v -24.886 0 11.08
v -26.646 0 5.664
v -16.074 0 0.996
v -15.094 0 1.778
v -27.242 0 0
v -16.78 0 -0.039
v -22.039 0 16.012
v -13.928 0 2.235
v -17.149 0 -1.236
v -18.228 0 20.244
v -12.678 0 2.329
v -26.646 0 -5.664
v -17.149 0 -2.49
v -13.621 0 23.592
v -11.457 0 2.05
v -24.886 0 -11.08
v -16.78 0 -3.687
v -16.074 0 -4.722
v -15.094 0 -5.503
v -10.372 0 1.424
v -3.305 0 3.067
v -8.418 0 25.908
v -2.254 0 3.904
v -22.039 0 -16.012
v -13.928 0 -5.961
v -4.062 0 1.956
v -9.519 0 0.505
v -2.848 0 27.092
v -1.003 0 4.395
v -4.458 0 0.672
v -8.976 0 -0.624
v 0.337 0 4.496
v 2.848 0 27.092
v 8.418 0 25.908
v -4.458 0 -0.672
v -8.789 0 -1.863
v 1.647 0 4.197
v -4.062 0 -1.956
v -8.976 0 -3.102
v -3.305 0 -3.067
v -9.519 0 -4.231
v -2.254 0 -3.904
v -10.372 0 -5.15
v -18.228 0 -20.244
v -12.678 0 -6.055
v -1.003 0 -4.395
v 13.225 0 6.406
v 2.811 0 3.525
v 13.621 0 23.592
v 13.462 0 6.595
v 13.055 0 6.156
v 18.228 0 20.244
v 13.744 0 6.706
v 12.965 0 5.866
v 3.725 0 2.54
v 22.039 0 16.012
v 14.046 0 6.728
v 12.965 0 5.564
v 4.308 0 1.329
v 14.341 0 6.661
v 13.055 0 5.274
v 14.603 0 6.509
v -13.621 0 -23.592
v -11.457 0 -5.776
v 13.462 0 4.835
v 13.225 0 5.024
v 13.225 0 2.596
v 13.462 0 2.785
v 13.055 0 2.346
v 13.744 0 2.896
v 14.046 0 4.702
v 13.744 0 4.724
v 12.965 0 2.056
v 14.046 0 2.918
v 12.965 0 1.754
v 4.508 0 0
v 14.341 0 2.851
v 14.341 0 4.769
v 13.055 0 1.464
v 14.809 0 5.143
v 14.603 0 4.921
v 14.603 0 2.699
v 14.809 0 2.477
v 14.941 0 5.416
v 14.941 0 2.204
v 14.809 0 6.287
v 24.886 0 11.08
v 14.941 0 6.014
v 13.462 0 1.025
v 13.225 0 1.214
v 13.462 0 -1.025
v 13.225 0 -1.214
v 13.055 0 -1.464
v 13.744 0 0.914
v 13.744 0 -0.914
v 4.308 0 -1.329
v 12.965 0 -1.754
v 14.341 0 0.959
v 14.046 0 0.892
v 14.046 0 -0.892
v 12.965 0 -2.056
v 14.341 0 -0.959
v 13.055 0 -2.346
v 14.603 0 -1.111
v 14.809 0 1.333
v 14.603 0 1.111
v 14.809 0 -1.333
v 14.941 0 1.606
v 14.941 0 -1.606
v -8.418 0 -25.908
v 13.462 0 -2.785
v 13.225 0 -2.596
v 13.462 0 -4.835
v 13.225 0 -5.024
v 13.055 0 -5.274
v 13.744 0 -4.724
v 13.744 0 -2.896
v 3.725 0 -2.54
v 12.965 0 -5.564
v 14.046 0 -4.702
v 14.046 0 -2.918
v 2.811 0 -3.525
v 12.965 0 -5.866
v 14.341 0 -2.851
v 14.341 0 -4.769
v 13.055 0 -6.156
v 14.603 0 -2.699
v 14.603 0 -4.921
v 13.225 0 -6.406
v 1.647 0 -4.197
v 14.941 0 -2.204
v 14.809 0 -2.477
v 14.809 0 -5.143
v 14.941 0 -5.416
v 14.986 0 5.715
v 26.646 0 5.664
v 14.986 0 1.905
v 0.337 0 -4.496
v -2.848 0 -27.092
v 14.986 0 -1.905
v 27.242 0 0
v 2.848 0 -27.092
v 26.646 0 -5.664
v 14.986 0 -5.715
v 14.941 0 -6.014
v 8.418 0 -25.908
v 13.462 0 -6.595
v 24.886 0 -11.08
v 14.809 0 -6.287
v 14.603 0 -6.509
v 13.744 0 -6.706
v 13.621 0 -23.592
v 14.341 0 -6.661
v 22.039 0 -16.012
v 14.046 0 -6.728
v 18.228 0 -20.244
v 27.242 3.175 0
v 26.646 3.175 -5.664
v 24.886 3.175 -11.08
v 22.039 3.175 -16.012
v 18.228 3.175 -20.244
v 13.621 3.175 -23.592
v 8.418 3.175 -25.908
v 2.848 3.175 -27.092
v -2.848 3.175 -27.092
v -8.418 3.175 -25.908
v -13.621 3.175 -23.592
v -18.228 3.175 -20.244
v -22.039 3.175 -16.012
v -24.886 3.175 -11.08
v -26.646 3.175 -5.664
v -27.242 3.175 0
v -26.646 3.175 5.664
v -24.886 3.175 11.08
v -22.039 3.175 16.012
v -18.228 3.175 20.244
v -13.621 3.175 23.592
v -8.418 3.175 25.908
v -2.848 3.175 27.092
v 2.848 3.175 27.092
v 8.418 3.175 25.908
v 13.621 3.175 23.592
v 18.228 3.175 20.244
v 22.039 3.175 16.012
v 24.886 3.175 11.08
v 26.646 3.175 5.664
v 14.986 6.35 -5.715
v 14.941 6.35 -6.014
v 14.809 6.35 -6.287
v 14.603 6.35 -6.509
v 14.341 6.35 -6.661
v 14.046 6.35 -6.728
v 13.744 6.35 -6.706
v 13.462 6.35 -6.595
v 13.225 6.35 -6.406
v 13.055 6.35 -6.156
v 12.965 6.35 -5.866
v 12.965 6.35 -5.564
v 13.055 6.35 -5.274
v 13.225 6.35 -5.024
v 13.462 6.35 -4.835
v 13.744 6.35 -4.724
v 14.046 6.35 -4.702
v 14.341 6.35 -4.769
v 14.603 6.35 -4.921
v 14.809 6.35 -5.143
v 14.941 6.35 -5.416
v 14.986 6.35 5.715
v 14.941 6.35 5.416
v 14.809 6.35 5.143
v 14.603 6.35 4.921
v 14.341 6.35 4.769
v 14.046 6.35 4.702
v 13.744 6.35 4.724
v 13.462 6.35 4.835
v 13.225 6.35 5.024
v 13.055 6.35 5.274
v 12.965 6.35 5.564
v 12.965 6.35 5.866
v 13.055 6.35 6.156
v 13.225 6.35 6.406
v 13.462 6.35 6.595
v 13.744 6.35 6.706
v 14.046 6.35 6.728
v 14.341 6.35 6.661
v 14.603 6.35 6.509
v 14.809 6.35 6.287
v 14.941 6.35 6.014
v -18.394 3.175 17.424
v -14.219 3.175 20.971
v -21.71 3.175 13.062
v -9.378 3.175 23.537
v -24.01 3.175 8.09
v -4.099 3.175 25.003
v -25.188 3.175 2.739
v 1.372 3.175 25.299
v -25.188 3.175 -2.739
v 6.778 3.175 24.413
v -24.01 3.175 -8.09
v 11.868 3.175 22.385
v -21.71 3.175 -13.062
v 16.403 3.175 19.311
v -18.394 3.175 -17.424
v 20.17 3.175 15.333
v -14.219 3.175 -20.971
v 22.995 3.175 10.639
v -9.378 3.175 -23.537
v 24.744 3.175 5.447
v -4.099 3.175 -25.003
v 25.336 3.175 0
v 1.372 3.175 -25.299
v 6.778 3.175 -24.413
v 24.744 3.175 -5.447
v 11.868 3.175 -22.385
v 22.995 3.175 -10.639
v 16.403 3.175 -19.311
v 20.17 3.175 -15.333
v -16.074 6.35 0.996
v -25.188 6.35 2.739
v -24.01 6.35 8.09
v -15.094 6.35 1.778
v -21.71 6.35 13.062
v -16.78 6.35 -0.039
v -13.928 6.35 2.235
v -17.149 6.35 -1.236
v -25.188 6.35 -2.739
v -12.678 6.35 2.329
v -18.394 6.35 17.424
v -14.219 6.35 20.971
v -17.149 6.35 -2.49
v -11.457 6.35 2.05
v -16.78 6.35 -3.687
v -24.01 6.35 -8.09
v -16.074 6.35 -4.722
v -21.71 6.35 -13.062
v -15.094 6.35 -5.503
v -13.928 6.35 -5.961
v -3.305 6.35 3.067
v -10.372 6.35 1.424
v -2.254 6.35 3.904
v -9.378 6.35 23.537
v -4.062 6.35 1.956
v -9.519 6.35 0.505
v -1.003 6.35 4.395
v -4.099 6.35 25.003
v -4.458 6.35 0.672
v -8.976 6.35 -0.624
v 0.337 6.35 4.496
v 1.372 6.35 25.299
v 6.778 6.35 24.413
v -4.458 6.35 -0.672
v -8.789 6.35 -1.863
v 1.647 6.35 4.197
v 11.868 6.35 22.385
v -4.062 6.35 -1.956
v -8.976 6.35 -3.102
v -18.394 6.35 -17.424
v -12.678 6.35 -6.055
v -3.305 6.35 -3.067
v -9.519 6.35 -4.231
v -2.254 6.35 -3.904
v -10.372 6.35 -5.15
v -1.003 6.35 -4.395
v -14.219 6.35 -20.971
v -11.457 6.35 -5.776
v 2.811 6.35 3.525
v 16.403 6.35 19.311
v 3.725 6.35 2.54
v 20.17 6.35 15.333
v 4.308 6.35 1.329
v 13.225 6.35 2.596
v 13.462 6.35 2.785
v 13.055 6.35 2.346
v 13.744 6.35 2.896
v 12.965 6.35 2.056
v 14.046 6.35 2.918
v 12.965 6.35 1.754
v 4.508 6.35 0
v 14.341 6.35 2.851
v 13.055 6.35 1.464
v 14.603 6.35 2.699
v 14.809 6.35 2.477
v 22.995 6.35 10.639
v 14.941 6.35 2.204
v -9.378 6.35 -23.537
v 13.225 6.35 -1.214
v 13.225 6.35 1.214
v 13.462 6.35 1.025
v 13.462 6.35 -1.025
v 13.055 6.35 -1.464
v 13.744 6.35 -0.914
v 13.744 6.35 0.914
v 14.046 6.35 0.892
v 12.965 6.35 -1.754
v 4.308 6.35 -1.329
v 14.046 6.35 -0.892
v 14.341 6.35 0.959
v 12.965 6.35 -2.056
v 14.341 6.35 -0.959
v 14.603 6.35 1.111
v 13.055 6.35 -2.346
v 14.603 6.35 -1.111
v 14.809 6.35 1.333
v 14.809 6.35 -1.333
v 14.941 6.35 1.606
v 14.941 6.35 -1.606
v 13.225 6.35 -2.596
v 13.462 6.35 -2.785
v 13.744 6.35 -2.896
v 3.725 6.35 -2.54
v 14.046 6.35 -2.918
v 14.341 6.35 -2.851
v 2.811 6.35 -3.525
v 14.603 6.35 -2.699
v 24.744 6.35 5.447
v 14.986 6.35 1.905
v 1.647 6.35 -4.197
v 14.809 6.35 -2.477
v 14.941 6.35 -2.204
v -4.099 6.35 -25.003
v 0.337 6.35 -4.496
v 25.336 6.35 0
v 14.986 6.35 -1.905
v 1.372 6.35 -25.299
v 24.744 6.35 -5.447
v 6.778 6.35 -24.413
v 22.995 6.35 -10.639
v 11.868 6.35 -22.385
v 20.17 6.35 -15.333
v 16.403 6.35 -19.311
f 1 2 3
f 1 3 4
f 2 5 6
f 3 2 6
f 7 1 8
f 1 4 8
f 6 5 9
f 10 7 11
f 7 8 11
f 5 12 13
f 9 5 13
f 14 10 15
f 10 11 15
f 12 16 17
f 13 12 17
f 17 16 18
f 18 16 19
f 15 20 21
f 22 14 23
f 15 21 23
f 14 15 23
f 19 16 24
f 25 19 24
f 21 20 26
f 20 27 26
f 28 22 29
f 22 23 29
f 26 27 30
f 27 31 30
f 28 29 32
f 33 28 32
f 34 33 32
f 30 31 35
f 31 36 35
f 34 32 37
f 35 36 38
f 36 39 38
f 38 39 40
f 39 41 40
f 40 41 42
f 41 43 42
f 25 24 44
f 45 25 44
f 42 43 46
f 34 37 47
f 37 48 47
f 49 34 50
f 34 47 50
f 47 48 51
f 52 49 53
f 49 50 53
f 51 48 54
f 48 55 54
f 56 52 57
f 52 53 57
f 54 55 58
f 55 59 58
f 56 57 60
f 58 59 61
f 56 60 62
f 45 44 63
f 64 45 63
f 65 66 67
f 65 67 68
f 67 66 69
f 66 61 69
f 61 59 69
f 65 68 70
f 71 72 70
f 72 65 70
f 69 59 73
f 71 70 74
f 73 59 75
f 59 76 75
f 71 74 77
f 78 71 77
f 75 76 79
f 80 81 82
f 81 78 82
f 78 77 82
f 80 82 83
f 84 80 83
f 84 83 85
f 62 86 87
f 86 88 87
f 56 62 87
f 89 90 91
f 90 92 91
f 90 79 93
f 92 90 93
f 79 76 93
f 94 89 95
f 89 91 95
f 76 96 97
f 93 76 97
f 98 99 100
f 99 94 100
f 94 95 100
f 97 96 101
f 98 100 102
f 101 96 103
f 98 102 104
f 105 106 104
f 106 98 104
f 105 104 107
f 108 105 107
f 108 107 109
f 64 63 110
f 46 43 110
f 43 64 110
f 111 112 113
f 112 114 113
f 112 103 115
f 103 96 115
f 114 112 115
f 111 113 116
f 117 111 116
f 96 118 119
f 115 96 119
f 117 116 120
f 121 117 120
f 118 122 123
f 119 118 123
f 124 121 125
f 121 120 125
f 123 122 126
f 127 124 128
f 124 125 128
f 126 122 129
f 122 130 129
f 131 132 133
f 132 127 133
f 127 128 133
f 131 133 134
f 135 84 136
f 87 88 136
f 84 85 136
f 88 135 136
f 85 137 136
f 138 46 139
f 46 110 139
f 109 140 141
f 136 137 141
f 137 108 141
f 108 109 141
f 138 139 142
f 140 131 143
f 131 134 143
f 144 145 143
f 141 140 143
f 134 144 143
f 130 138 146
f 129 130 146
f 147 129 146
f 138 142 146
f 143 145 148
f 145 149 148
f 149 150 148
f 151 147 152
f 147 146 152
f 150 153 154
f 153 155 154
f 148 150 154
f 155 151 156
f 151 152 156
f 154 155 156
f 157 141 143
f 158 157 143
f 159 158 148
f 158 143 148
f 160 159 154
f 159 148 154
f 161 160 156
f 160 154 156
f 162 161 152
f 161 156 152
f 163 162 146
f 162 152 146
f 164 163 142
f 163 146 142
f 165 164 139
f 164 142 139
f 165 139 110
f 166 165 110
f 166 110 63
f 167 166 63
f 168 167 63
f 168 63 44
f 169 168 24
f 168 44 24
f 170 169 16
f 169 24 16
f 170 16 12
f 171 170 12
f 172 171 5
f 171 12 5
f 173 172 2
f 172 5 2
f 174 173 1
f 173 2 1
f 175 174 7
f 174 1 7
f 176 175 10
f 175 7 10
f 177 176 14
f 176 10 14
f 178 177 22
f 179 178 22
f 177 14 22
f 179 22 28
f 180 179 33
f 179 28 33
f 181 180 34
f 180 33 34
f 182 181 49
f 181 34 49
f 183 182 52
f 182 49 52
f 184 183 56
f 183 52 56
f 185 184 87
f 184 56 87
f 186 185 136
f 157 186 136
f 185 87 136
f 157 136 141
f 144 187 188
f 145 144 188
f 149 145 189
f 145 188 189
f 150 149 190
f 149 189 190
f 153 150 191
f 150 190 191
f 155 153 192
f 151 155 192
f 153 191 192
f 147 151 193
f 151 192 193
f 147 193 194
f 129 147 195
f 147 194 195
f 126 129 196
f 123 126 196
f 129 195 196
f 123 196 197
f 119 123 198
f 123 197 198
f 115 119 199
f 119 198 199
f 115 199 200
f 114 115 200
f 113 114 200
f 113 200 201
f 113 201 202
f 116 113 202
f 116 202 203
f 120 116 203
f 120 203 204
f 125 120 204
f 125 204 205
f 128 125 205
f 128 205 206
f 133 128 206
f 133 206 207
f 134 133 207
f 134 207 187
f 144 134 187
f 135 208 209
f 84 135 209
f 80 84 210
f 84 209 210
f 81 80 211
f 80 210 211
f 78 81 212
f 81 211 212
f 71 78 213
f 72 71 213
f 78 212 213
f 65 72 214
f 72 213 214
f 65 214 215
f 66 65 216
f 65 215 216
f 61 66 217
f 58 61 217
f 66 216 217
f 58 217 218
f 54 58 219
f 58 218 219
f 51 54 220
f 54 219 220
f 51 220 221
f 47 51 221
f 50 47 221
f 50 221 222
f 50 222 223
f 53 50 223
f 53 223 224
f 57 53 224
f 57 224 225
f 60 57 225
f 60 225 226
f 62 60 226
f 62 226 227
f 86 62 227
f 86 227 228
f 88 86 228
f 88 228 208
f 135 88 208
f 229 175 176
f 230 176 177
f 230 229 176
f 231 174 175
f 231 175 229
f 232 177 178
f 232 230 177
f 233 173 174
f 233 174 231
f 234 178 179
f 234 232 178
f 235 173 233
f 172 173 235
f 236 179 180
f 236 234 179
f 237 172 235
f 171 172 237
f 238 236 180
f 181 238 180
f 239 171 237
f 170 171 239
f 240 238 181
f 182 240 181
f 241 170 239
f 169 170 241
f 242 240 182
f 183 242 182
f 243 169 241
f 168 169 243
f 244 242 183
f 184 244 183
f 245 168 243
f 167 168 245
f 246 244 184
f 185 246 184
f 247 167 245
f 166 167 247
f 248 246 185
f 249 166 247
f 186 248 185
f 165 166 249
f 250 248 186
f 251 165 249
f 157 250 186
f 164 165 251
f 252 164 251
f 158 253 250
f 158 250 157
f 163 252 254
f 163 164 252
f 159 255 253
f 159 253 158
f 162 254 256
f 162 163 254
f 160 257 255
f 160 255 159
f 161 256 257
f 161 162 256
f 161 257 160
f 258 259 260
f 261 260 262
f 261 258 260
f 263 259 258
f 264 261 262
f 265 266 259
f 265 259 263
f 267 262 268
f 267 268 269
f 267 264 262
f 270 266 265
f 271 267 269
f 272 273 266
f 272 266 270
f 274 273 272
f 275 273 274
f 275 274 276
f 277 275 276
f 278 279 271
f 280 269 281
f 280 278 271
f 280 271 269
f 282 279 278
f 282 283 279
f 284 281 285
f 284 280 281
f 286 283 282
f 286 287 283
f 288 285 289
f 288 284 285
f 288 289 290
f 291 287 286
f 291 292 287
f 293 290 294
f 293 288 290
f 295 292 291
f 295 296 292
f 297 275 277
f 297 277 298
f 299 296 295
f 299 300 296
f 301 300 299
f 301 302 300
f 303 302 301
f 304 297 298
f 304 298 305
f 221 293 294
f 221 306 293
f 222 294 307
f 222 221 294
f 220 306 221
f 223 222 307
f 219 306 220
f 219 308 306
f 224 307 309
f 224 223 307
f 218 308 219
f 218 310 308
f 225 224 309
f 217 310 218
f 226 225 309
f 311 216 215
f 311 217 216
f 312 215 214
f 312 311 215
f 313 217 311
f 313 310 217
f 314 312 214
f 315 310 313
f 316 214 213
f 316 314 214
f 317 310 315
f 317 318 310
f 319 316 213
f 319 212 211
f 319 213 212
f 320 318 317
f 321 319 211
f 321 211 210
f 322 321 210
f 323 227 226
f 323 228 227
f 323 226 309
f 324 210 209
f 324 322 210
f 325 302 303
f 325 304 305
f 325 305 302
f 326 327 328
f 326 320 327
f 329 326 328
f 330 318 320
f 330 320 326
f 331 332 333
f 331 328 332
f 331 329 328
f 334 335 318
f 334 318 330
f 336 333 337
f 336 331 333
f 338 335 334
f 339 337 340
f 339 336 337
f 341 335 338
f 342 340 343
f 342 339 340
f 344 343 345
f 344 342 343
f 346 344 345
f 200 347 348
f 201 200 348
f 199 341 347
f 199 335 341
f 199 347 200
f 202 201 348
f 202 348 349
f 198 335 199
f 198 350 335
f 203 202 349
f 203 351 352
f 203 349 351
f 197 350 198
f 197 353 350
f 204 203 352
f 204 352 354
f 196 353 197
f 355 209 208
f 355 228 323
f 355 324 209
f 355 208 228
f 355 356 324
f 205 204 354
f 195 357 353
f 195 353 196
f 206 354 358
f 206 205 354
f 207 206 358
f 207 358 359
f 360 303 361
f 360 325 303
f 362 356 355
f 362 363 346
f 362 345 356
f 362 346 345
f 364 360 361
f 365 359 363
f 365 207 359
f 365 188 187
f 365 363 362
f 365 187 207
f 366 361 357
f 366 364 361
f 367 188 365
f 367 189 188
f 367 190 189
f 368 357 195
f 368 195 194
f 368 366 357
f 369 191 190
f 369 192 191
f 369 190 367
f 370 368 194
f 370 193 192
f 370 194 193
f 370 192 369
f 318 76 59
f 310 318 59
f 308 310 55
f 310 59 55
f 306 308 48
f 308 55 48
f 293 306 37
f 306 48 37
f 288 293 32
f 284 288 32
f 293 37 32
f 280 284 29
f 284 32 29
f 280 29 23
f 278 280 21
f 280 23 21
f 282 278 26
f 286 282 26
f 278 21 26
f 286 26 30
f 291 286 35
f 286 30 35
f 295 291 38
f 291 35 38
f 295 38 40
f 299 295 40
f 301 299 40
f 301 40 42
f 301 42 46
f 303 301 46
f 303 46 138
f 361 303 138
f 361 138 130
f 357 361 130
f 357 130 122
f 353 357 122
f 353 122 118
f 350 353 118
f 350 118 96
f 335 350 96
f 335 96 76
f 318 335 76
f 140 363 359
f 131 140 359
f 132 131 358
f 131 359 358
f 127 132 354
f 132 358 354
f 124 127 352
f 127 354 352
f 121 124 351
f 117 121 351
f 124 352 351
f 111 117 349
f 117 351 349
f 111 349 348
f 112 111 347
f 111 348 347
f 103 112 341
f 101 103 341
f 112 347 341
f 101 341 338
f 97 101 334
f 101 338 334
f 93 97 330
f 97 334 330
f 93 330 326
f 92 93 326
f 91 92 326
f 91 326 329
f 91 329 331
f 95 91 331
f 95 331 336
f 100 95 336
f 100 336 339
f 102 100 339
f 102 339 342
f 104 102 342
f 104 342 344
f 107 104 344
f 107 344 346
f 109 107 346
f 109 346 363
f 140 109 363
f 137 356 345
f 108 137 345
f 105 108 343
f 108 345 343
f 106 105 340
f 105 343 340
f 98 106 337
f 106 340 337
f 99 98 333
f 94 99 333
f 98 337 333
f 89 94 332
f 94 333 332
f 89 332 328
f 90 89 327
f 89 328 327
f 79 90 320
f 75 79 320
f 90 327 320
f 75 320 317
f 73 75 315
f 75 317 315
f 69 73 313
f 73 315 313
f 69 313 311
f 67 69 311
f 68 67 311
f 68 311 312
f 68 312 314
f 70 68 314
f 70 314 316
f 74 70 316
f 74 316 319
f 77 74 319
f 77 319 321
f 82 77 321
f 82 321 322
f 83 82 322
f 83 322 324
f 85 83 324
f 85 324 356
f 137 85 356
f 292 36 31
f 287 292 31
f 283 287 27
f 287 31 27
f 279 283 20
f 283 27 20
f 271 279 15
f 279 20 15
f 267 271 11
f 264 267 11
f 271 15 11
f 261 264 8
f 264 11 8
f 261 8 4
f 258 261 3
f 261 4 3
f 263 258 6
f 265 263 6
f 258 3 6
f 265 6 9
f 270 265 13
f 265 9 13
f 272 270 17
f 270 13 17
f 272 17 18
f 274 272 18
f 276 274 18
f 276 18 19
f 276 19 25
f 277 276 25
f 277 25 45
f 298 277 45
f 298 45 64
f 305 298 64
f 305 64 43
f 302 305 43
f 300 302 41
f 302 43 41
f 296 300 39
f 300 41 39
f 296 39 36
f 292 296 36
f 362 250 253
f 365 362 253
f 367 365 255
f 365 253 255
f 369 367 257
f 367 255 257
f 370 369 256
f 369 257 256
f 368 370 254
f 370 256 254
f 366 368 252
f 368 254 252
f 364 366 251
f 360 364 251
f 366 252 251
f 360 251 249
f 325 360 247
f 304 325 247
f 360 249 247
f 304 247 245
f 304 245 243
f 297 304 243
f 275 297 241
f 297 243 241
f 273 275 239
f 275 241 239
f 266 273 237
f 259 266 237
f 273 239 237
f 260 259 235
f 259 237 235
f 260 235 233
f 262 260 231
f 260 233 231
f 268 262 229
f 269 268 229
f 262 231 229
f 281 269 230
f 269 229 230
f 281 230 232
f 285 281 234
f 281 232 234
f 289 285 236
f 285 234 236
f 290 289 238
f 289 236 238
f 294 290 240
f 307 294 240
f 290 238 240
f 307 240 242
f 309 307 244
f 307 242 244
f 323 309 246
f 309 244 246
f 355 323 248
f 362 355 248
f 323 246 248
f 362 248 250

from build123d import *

# Parameters (mm, degrees)
SKETCH1_R           = 27.2415
BOSS_EXTRUDE1_DEPTH = 3.175
SKETCH2_R           = 25.3365
BOSS_EXTRUDE2_DEPTH = 3.175
SKETCH5_R           = 4.2037
CUT_EXTRUDE1_DEPTH  = 6.35
CUT_EXTRUDE2_REACH  = 8.35
SKETCH6_R           = 4.5085
CUT_EXTRUDE3_REACH  = 8.35
SKETCH9_R           = 1.016


with BuildPart() as part:
    # Sketch1 → Boss-Extrude1 (new body)
    with BuildSketch(Plane(origin=(0, 0, 0), x_dir=(1, 0, 0), z_dir=(0, 1, 0))):
        Circle(SKETCH1_R)
    extrude(amount=BOSS_EXTRUDE1_DEPTH)

    # Sketch2 → Boss-Extrude2 (add)
    with BuildSketch(Plane(origin=(0, 3.175, 0), x_dir=(1, 0, 0), z_dir=(0, 1, 0))):
        Circle(SKETCH2_R)
    extrude(amount=BOSS_EXTRUDE2_DEPTH)

    # Sketch5 → Cut-Extrude1 (cut)
    with BuildSketch(Plane.XZ):
        with Locations((-12.992582175, -1.862973623)):
            Circle(SKETCH5_R)
    extrude(amount=-CUT_EXTRUDE1_DEPTH, mode=Mode.SUBTRACT)

    # Sketch6 → Cut-Extrude2 (cut, up to next)
    with BuildSketch(Plane.XZ, mode=Mode.PRIVATE) as cut_extrude2_sk1:
        Circle(SKETCH6_R)
    cut_extrude2_tool1 = extrude(cut_extrude2_sk1.sketch, amount=-CUT_EXTRUDE2_REACH, mode=Mode.PRIVATE) & part.part
    add(cut_extrude2_tool1.solids().sort_by_distance((0, 0, 0))[0], mode=Mode.SUBTRACT)

    # Sketch9 → Cut-Extrude3 (cut, up to next)
    with BuildSketch(Plane(origin=(0, 6.35, 0), x_dir=(1, 0, 0), z_dir=(0, 1, 0)), mode=Mode.PRIVATE) as cut_extrude3_sk1:
        with Locations((13.97, 5.715)):
            Circle(SKETCH9_R)
    cut_extrude3_tool1 = extrude(cut_extrude3_sk1.sketch, amount=-CUT_EXTRUDE3_REACH, mode=Mode.PRIVATE) & part.part
    add(cut_extrude3_tool1.solids().sort_by_distance((13.97, 6.35, -5.715))[0], mode=Mode.SUBTRACT)
    # Sketch9 → Cut-Extrude3 (cut, up to next)
    with BuildSketch(Plane(origin=(0, 6.35, 0), x_dir=(1, 0, 0), z_dir=(0, 1, 0)), mode=Mode.PRIVATE) as cut_extrude3_sk2:
        with Locations((13.97, 1.905)):
            Circle(SKETCH9_R)
    cut_extrude3_tool2 = extrude(cut_extrude3_sk2.sketch, amount=-CUT_EXTRUDE3_REACH, mode=Mode.PRIVATE) & part.part
    add(cut_extrude3_tool2.solids().sort_by_distance((13.97, 6.35, -1.905))[0], mode=Mode.SUBTRACT)
    # Sketch9 → Cut-Extrude3 (cut, up to next)
    with BuildSketch(Plane(origin=(0, 6.35, 0), x_dir=(1, 0, 0), z_dir=(0, 1, 0)), mode=Mode.PRIVATE) as cut_extrude3_sk3:
        with Locations((13.97, -1.905)):
            Circle(SKETCH9_R)
    cut_extrude3_tool3 = extrude(cut_extrude3_sk3.sketch, amount=-CUT_EXTRUDE3_REACH, mode=Mode.PRIVATE) & part.part
    add(cut_extrude3_tool3.solids().sort_by_distance((13.97, 6.35, 1.905))[0], mode=Mode.SUBTRACT)
    # Sketch9 → Cut-Extrude3 (cut, up to next)
    with BuildSketch(Plane(origin=(0, 6.35, 0), x_dir=(1, 0, 0), z_dir=(0, 1, 0)), mode=Mode.PRIVATE) as cut_extrude3_sk4:
        with Locations((13.97, -5.715)):
            Circle(SKETCH9_R)
    cut_extrude3_tool4 = extrude(cut_extrude3_sk4.sketch, amount=-CUT_EXTRUDE3_REACH, mode=Mode.PRIVATE) & part.part
    add(cut_extrude3_tool4.solids().sort_by_distance((13.97, 6.35, 5.715))[0], mode=Mode.SUBTRACT)


solid = part.part
